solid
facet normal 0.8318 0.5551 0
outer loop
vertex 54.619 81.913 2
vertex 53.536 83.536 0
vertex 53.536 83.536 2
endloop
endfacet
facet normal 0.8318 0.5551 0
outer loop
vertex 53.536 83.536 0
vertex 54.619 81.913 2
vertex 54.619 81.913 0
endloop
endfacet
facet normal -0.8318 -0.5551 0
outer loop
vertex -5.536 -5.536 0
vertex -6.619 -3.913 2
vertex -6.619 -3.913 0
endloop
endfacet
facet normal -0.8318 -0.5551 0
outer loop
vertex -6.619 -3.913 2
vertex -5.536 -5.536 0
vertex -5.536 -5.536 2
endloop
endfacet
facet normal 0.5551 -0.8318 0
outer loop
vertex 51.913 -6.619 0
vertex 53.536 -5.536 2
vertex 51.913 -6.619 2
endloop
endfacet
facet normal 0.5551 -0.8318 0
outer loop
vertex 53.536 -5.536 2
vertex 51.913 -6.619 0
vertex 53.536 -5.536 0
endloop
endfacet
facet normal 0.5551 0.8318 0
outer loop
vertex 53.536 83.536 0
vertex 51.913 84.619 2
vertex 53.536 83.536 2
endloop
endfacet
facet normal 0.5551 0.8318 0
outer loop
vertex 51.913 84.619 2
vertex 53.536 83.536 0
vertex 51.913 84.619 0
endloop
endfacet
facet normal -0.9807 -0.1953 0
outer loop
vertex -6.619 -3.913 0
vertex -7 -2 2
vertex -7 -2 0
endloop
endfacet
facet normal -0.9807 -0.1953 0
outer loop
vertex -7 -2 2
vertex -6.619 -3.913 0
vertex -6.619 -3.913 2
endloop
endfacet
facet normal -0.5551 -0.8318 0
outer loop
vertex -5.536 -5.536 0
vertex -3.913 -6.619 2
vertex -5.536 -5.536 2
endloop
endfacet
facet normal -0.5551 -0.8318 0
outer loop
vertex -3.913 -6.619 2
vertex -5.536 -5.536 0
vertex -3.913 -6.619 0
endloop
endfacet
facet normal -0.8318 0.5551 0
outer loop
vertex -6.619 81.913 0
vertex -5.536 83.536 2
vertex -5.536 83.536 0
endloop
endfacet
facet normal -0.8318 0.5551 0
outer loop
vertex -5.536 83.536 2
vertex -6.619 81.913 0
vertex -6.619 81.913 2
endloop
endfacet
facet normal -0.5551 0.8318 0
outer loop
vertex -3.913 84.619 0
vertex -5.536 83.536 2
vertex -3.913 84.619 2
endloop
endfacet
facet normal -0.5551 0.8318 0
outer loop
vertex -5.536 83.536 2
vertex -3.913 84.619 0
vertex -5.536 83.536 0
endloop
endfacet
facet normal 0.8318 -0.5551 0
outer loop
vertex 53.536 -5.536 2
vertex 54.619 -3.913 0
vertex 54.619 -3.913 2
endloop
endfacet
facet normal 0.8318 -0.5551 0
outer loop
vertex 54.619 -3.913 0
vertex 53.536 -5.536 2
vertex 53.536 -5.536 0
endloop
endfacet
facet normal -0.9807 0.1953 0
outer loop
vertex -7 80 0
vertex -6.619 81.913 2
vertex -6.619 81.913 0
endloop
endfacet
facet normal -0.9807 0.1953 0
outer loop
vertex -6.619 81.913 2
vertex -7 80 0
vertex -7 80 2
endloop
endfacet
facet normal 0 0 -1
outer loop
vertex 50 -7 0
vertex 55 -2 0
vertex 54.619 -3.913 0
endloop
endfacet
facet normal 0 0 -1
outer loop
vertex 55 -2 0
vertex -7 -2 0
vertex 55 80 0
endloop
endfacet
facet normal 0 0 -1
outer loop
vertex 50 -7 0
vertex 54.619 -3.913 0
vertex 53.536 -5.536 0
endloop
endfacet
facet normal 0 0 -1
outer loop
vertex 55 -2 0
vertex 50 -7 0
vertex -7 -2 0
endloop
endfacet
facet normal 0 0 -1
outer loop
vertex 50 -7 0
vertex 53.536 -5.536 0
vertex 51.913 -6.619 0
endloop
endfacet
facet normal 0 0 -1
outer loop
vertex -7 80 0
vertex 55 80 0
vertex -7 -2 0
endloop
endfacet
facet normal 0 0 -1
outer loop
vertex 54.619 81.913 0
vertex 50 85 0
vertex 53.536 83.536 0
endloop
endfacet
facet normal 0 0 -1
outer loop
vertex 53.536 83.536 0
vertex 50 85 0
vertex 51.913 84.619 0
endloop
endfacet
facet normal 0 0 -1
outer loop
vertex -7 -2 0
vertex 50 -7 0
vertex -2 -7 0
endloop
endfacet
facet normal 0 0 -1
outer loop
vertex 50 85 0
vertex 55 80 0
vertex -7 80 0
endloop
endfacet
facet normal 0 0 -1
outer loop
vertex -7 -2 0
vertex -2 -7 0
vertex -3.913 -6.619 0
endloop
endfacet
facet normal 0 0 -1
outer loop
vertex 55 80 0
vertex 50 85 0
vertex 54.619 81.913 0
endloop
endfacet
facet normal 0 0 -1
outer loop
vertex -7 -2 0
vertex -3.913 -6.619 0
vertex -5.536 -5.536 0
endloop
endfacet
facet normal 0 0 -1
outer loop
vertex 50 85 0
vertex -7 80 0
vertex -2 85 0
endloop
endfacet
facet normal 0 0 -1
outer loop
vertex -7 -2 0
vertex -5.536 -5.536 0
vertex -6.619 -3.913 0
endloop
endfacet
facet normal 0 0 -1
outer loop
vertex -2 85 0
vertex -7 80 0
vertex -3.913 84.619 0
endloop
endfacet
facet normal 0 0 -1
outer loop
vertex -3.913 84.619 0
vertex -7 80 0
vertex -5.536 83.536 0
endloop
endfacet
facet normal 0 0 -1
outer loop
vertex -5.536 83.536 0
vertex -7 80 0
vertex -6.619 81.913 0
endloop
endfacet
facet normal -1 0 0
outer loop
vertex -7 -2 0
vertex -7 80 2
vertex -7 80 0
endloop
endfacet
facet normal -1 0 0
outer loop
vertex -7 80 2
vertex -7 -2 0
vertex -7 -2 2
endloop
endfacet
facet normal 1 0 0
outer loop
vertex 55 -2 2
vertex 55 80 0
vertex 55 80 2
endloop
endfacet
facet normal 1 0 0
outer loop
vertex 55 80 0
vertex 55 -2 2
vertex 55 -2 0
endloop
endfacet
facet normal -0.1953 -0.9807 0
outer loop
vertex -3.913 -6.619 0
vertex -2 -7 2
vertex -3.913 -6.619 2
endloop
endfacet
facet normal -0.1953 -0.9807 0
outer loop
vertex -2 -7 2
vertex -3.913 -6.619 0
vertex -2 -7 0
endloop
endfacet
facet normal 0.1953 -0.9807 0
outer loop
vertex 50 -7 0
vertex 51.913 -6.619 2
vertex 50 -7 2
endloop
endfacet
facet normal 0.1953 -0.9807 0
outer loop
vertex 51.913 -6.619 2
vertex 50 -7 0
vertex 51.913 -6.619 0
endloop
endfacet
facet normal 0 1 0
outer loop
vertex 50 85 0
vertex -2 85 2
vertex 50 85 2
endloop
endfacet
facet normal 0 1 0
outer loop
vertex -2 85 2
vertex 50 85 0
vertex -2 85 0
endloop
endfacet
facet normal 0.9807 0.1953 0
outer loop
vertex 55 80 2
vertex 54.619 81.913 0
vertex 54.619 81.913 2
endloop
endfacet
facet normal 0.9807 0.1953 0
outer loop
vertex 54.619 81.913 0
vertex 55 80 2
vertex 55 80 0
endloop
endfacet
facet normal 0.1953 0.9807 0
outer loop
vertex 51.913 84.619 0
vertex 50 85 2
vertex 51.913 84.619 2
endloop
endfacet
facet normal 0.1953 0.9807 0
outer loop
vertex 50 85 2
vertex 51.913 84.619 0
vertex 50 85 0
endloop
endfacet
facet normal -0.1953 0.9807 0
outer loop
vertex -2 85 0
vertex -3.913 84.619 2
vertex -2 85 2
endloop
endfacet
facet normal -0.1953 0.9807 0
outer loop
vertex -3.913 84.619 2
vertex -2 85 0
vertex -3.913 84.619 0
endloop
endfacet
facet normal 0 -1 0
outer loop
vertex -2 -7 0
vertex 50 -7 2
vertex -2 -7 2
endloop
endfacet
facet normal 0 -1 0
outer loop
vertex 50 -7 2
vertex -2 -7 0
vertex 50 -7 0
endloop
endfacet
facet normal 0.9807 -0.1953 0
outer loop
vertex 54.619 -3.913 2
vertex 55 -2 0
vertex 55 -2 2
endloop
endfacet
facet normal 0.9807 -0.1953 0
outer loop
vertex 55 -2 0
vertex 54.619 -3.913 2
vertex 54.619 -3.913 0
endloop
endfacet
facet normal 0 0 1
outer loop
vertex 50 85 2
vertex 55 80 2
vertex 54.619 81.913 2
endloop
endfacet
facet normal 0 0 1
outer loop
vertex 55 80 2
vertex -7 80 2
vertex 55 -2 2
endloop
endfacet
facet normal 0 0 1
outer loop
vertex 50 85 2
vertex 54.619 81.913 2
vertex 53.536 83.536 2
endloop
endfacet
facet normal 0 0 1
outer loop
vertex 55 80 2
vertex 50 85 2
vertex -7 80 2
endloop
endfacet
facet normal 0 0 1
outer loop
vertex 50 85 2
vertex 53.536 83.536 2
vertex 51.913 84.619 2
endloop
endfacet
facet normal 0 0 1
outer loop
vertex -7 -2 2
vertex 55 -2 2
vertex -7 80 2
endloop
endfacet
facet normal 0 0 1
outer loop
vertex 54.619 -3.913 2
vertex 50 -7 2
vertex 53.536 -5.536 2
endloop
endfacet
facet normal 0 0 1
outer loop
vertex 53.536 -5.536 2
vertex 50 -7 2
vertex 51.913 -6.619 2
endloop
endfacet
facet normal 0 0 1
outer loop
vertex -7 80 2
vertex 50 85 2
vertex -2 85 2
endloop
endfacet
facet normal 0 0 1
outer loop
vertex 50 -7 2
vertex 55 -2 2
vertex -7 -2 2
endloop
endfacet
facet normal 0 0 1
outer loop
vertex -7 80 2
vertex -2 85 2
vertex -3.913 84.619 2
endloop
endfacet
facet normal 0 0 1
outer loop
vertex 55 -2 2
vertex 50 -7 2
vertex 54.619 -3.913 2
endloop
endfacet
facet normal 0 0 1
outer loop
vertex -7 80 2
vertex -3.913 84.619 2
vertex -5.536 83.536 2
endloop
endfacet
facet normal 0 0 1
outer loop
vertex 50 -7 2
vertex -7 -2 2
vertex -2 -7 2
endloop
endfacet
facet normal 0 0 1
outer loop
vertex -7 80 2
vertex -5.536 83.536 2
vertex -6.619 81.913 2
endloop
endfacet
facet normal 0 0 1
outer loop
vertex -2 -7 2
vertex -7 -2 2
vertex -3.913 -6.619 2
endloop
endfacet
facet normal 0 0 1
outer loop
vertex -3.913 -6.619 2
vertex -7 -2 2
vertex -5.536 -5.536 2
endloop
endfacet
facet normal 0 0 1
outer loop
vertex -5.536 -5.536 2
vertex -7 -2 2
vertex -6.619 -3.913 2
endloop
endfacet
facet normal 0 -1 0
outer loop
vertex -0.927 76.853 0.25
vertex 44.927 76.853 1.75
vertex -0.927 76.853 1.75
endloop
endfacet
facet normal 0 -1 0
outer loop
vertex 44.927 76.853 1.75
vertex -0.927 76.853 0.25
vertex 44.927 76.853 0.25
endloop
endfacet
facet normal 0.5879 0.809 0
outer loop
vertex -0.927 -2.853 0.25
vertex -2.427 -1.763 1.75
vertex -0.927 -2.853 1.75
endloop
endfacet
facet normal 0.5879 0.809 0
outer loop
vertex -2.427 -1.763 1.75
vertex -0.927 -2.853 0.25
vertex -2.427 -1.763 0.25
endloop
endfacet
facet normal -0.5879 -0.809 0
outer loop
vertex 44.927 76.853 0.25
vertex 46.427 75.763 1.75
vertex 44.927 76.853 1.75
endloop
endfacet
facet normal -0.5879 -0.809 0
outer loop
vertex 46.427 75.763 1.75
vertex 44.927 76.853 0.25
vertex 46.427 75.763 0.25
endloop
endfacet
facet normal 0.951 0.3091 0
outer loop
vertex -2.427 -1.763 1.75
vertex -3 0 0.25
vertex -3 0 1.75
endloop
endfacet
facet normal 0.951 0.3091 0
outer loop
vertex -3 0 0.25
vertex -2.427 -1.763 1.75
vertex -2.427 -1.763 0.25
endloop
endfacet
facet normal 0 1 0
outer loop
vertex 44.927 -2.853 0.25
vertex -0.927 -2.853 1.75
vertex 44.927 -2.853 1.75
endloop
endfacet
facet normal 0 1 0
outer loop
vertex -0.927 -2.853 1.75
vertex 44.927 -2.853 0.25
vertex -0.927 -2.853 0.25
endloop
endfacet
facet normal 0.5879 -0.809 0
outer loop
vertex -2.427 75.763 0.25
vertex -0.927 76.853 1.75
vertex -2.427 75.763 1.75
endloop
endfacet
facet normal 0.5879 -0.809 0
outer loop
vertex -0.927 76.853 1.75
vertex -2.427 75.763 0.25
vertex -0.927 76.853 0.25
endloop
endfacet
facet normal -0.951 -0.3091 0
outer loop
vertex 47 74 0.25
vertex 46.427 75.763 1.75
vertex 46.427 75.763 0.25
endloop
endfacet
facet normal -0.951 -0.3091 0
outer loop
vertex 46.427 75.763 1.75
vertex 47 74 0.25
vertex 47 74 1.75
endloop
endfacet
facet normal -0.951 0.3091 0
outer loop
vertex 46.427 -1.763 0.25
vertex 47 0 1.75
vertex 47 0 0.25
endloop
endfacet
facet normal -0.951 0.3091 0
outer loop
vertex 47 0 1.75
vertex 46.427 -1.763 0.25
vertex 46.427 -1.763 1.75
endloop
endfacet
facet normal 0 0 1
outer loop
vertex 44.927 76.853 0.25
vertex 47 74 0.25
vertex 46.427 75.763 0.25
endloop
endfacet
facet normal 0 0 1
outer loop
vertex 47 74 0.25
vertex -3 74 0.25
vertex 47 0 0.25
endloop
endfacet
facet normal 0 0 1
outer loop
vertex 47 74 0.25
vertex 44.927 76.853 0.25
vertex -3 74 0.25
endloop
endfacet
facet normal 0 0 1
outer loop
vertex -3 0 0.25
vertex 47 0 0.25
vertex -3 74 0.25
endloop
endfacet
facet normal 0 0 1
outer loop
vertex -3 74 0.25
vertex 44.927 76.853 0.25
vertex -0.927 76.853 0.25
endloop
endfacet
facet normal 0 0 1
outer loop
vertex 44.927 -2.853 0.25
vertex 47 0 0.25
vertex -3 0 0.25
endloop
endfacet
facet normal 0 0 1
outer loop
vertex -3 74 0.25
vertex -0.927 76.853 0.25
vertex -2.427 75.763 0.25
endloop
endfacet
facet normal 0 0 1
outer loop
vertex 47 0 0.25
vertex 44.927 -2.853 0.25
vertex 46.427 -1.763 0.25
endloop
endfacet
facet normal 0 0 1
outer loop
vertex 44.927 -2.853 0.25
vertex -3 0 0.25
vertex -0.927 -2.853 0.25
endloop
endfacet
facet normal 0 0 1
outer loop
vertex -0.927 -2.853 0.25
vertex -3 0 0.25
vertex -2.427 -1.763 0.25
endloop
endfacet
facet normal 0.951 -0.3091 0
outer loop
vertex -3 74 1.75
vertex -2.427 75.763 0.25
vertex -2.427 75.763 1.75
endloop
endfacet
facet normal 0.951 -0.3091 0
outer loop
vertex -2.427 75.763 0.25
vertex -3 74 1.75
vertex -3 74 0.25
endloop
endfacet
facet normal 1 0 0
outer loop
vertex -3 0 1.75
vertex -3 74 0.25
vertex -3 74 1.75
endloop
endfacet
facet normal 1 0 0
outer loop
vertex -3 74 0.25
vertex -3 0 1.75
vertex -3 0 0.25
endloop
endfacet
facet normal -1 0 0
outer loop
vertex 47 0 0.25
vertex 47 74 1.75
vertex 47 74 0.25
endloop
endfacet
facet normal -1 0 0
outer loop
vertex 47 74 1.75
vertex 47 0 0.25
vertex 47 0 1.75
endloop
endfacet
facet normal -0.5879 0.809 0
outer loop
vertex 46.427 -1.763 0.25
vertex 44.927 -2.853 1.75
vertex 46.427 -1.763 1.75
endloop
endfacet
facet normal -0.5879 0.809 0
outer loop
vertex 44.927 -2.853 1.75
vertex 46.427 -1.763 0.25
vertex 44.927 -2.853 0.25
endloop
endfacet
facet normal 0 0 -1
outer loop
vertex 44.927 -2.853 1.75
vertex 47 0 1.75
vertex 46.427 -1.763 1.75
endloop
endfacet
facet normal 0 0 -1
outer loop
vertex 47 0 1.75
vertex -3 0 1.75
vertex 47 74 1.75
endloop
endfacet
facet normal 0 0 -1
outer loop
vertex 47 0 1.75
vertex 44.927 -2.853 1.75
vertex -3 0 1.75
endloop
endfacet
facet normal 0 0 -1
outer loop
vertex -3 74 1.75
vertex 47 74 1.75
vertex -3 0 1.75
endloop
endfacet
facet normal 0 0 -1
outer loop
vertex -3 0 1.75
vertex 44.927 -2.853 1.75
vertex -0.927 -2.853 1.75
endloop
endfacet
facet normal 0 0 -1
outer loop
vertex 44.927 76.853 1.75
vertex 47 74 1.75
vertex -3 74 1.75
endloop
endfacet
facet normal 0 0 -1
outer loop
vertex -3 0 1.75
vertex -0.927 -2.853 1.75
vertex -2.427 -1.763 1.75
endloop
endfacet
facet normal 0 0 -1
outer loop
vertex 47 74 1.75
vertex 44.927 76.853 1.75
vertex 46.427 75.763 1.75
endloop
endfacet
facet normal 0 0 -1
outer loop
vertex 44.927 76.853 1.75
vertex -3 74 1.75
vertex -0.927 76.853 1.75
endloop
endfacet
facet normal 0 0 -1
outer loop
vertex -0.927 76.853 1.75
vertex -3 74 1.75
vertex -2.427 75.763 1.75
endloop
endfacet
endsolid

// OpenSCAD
badgeWidth = 50;
badgeHeight = 80;
badgeThick = 1.5;
badgeCornerRad = 3;

holderThick = 2;

difference() {
   holderOutline();
   badgeCutout();
}

module badgeCutout() {
   translate([0,0,holderThick/2 - badgeThick/2]) 
      linear_extrude(height=badgeThick) hull() {
         translate([0,0,0])
            circle(r=badgeCornerRad);
         translate([badgeWidth - 2 * badgeCornerRad,0,0])
            circle(r=badgeCornerRad);
         translate([0,badgeHeight - 2 * badgeCornerRad,0])
            circle(r=badgeCornerRad);
         translate([badgeWidth - 2 * badgeCornerRad, badgeHeight - 2 * badgeCornerRad,0])
            circle(r=badgeCornerRad);
      }
}

module holderOutline() {
   holderCornerRad = badgeCornerRad + holderThick;

   linear_extrude(height=holderThick) hull() {
      translate([-1*holderThick,-1*holderThick,0])
         circle(r=holderCornerRad);
      translate([-1*holderThick,badgeHeight,0])
         circle(r=holderCornerRad);
      translate([badgeWidth,-1*holderThick,0])
         circle(r=holderCornerRad);
      translate([badgeWidth,badgeHeight,0])
         circle(r=holderCornerRad);
   }
}
